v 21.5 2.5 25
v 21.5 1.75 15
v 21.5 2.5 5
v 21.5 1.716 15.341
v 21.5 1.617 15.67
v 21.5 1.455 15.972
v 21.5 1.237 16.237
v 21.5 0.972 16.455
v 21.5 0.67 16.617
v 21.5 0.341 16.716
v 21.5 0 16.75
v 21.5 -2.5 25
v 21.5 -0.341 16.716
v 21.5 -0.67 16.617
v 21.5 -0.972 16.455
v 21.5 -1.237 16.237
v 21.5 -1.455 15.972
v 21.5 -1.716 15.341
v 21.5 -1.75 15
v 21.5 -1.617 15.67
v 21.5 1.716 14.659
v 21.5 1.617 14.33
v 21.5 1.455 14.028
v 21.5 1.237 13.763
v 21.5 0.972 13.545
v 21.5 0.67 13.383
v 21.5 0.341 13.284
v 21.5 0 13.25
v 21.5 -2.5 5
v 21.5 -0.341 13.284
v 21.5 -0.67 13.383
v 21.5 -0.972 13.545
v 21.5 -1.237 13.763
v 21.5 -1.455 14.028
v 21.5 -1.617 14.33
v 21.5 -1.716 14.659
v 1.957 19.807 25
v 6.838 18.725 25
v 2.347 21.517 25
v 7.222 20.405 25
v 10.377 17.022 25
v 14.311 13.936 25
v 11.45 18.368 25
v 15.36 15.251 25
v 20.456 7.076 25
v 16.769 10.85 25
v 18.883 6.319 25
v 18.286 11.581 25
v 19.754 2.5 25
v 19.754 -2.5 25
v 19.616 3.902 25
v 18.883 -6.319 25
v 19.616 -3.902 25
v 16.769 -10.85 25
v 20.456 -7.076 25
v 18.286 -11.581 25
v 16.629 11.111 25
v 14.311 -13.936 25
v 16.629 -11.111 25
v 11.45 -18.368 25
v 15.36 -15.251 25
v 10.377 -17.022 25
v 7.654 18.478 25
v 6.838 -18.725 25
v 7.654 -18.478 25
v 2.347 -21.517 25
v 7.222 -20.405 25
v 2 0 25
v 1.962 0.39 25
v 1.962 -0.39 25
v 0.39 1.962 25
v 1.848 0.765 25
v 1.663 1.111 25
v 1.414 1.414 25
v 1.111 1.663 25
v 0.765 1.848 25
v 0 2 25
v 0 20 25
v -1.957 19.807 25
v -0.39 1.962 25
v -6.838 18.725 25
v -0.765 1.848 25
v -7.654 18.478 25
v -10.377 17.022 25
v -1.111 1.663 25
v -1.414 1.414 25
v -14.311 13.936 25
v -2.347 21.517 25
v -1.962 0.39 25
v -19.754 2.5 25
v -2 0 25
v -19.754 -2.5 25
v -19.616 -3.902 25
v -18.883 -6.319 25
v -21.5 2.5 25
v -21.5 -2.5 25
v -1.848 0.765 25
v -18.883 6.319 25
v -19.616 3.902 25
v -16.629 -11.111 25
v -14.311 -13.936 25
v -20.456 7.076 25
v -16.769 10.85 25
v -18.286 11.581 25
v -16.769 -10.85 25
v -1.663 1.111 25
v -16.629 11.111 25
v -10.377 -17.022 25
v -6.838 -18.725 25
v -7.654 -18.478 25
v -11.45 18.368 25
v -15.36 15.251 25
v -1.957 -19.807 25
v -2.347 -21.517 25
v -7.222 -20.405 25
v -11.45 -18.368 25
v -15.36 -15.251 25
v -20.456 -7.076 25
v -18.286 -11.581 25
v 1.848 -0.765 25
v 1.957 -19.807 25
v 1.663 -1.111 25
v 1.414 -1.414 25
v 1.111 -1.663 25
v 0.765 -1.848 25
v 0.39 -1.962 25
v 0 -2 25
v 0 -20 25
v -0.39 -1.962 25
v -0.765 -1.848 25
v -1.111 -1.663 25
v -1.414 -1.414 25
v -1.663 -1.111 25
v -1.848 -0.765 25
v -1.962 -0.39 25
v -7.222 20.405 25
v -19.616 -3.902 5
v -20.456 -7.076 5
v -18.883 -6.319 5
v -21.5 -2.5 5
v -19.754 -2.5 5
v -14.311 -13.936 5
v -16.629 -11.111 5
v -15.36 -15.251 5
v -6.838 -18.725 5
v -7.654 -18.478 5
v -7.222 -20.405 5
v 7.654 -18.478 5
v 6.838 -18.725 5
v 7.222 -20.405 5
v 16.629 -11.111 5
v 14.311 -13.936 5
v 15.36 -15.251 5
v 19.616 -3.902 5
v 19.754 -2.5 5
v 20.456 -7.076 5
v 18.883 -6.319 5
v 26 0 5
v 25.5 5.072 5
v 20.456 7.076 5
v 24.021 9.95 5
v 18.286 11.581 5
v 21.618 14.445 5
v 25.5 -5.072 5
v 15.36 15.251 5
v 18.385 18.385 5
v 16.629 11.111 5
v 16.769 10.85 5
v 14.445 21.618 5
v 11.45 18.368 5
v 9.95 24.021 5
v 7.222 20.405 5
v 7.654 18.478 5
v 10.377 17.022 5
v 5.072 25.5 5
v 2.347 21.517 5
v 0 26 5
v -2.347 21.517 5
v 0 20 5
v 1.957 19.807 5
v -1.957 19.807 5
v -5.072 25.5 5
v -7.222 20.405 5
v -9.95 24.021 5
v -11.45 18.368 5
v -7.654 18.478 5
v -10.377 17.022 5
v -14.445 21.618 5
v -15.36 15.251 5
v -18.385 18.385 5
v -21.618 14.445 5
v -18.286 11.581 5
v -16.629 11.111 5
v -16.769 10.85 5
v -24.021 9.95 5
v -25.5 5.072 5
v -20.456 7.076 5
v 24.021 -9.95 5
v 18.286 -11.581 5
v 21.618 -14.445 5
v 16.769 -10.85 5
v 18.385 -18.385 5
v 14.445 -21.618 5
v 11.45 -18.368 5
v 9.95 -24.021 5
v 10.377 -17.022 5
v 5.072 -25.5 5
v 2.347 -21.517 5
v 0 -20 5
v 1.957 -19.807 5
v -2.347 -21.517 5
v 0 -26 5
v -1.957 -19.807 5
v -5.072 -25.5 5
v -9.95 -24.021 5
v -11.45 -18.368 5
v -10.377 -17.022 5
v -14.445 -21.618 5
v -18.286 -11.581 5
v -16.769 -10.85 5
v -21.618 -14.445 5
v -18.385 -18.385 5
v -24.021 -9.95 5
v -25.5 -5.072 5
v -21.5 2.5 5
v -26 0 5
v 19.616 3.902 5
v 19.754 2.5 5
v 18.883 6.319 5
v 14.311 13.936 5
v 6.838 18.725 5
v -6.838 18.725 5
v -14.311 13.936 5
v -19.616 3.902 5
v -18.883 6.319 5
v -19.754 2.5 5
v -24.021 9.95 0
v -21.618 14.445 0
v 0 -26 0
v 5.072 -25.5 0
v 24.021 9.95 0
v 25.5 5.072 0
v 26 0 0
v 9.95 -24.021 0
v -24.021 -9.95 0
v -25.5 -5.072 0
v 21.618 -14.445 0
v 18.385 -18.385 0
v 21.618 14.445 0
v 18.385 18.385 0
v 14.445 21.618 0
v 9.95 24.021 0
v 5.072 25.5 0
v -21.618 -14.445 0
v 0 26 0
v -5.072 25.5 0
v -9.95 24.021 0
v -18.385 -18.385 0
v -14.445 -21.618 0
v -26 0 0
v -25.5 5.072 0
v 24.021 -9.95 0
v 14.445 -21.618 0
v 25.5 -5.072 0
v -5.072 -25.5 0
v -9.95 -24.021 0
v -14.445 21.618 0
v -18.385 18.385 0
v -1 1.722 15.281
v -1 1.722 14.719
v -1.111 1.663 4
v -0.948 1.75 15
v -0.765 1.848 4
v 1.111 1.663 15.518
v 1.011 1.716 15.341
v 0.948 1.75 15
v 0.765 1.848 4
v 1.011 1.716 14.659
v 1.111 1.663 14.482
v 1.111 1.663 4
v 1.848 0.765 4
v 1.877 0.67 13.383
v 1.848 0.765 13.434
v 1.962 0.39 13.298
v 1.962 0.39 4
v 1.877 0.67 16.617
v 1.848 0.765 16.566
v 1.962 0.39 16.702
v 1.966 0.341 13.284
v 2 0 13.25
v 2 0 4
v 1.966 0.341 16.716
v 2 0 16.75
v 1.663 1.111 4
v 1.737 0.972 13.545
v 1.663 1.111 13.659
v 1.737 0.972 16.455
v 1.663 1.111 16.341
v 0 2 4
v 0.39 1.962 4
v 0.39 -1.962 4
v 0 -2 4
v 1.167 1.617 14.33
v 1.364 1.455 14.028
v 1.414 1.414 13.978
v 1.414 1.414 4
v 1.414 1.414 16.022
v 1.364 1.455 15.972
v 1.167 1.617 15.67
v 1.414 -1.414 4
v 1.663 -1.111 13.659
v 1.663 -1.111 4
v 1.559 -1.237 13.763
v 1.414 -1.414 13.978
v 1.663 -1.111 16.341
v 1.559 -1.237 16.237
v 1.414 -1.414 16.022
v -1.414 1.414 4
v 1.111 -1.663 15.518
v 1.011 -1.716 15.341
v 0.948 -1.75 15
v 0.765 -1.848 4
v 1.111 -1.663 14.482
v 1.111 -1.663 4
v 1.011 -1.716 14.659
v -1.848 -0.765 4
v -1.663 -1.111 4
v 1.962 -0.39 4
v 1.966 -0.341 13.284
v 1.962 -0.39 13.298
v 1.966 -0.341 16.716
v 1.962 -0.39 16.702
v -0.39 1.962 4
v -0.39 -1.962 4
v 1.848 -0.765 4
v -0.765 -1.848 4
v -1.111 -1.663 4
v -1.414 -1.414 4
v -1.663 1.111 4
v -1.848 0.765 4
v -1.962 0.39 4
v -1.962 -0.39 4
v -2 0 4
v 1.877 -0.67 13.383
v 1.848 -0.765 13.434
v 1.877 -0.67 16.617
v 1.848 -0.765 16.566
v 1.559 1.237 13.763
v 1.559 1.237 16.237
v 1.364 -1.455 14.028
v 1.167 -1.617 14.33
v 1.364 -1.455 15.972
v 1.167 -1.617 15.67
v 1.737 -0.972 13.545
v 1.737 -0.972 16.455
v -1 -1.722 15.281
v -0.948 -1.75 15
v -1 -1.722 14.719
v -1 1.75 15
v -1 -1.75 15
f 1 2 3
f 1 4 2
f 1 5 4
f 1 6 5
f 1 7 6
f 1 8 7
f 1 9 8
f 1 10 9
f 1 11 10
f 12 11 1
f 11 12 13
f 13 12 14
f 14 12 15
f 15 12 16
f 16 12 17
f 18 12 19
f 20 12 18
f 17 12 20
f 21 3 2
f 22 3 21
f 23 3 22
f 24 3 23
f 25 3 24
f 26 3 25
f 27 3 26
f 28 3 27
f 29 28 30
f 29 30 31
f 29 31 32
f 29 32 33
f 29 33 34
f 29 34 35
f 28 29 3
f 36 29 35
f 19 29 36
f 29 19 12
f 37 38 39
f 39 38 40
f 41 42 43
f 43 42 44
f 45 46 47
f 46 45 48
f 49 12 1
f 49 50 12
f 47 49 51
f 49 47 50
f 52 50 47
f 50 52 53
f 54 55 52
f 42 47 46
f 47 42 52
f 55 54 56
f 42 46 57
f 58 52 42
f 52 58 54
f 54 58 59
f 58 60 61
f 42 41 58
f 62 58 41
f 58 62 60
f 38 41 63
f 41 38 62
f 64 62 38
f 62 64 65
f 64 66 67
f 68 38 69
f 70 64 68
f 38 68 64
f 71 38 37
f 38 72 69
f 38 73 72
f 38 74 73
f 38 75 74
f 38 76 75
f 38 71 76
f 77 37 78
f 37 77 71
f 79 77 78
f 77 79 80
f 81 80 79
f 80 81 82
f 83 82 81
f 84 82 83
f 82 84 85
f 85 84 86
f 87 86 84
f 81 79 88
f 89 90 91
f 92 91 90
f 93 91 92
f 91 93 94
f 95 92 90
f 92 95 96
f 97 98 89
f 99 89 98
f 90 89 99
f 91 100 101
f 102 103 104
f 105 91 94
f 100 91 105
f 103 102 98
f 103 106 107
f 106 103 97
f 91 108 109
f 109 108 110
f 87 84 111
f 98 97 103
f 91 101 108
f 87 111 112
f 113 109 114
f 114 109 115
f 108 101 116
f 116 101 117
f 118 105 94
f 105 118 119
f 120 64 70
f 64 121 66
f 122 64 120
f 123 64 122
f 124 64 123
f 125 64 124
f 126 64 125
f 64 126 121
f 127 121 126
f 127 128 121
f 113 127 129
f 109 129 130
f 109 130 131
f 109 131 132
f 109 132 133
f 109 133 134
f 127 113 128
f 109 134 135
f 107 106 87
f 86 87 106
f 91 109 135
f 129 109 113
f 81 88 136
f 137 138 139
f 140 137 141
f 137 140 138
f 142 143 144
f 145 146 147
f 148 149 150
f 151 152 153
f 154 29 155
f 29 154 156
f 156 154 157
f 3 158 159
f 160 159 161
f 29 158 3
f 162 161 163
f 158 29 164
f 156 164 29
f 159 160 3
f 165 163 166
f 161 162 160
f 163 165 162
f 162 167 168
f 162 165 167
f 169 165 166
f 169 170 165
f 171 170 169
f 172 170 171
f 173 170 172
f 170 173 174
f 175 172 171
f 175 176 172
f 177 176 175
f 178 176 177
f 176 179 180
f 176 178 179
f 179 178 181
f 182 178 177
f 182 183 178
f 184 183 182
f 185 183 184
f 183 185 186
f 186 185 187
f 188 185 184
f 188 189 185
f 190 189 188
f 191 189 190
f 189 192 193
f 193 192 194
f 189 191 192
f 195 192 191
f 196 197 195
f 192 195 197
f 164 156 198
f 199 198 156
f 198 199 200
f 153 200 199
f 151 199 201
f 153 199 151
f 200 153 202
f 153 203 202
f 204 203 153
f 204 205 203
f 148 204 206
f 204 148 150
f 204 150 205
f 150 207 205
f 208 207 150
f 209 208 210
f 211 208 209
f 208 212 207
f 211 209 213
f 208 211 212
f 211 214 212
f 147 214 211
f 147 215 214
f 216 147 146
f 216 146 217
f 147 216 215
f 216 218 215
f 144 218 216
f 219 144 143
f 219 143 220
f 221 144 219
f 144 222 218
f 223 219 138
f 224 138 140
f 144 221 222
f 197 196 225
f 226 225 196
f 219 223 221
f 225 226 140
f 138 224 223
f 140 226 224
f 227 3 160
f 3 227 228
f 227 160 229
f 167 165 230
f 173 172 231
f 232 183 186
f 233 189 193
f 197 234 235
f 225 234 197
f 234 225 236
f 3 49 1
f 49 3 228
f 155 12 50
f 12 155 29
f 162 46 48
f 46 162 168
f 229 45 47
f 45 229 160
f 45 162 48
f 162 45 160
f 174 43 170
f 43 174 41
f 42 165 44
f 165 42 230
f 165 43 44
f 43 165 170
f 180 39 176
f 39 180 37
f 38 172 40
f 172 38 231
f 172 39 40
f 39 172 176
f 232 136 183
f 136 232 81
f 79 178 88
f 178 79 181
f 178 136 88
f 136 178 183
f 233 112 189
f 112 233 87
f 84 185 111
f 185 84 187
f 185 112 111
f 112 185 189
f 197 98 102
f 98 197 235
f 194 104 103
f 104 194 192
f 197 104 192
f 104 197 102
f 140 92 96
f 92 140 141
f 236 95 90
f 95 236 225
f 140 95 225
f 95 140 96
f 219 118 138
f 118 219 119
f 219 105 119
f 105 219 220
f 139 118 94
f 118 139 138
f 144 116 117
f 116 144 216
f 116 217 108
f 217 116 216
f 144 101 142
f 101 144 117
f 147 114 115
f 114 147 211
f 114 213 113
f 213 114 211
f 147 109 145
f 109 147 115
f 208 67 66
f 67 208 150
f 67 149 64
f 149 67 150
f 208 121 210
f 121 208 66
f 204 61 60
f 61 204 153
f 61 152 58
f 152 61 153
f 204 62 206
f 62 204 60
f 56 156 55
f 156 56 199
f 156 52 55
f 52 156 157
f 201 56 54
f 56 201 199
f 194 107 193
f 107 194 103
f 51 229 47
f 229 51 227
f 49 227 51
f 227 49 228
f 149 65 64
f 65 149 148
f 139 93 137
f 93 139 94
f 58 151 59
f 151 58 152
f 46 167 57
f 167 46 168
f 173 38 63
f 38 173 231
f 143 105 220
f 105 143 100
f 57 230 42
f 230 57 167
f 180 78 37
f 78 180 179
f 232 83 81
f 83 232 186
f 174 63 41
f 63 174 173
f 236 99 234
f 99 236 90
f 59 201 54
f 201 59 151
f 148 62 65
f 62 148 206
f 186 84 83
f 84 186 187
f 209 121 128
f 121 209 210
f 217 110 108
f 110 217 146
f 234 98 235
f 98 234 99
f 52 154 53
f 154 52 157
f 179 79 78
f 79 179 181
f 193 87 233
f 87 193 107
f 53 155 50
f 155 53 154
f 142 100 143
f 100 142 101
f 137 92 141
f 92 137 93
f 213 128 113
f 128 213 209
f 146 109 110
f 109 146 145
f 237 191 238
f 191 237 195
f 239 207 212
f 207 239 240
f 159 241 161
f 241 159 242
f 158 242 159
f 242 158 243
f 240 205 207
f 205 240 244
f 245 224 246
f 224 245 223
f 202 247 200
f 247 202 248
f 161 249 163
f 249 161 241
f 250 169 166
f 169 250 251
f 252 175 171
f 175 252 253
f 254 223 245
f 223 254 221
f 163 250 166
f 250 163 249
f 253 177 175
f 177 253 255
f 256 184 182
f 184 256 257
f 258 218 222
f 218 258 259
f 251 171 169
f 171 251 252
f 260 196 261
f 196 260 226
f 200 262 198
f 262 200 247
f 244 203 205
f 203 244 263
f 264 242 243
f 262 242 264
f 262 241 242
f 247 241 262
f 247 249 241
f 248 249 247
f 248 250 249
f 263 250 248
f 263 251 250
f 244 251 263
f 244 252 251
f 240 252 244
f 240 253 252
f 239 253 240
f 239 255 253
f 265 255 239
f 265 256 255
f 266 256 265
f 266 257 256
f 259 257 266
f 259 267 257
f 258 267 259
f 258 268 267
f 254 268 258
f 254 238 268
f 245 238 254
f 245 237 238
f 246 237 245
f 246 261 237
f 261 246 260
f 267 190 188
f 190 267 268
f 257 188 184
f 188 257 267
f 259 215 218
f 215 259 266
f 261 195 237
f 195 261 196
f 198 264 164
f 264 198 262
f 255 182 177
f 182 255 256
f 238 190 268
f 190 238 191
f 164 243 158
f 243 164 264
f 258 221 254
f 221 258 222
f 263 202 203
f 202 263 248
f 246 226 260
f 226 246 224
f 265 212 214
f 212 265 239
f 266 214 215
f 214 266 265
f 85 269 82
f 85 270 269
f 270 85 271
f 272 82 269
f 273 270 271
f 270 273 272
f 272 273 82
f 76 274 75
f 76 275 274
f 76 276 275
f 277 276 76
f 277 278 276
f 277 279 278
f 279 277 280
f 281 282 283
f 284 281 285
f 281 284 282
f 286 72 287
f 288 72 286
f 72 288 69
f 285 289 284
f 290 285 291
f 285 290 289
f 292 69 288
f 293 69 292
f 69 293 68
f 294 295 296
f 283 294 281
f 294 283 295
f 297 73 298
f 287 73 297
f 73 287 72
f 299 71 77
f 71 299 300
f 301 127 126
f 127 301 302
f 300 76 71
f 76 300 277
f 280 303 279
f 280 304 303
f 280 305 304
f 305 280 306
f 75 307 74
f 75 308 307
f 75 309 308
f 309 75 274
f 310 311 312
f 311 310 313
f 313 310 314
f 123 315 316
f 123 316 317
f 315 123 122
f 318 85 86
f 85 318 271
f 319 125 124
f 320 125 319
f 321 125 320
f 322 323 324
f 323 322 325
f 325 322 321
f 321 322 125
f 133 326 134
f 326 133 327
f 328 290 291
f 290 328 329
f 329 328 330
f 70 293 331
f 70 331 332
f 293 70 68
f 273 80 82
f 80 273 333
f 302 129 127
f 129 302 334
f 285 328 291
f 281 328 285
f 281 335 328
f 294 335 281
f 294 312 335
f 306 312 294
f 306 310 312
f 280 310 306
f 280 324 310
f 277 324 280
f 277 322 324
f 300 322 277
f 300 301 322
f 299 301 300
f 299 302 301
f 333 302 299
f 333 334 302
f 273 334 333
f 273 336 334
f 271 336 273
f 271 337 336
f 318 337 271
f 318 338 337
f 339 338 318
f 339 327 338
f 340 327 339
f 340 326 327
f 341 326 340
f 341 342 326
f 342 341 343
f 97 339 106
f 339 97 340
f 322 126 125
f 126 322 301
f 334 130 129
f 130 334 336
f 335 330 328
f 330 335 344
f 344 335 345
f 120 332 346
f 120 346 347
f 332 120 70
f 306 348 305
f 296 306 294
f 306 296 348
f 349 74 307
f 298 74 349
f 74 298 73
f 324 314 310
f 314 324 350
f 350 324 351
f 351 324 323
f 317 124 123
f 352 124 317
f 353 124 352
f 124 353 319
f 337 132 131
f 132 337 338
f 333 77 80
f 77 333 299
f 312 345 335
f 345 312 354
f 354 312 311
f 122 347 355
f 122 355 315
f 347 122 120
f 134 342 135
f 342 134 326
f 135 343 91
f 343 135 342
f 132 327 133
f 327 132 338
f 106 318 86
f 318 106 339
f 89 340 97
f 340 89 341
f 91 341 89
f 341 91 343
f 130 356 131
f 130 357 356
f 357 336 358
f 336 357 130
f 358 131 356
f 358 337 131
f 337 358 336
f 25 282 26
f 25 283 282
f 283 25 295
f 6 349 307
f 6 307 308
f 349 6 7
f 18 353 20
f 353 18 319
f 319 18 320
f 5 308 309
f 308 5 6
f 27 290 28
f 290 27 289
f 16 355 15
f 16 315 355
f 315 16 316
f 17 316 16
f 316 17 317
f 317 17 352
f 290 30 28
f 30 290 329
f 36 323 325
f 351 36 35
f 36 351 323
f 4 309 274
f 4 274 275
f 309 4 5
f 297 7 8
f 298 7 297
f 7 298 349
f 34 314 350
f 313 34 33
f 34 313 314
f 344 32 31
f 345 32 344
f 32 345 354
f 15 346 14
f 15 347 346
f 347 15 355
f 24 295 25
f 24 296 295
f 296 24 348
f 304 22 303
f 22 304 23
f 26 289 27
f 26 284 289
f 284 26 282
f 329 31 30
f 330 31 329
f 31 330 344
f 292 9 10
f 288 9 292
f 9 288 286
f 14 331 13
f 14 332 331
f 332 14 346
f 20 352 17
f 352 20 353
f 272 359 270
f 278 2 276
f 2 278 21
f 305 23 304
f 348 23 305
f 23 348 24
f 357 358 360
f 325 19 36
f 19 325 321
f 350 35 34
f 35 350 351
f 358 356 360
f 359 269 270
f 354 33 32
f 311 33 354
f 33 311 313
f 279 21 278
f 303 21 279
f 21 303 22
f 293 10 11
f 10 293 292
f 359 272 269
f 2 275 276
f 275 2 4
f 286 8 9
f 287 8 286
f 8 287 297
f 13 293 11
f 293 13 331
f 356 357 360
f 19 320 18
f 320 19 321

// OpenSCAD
$fn = 32;

// ----------------------------------------------------------------------
// Control knob: skirt knob with grip ribs
// ----------------------------------------------------------------------

// --- parameters (mm) ---
skirt_d = 52;             // skirt diameter
skirt_t = 5;              // skirt thickness
rib_w = 5;                // grip rib width
rib_out = 2.5;            // grip rib radial protrusion
n_ribs = 14;              // number of grip ribs
knob_d = 40;              // knob body diameter
knob_h = 20;              // knob body height
bore_d = 4;               // shaft bore diameter
set_d = 3.5;              // set screw bore diameter

rib_step = 360 / n_ribs;  // rib angular step
total_h = skirt_t + knob_h;  // overall height

difference() {
  union() {
    translate([0, 0, skirt_t]) cylinder(h = knob_h, d = knob_d);
    cylinder(h = skirt_t, d = skirt_d);
    for (i = [0 : n_ribs - 1])
      rotate([0, 0, i * rib_step])
        translate([knob_d / 2 - 1, -rib_w / 2, skirt_t])
          cube([rib_out, rib_w, knob_h]);
  }
  translate([0, 0, skirt_t - 1]) cylinder(h = knob_h + 2, d = bore_d);
  translate([-1, 0, skirt_t + knob_h / 2]) rotate([0, 90, 0])
    cylinder(h = knob_d / 2 + bore_d / 2 + 2, d = set_d);
}
